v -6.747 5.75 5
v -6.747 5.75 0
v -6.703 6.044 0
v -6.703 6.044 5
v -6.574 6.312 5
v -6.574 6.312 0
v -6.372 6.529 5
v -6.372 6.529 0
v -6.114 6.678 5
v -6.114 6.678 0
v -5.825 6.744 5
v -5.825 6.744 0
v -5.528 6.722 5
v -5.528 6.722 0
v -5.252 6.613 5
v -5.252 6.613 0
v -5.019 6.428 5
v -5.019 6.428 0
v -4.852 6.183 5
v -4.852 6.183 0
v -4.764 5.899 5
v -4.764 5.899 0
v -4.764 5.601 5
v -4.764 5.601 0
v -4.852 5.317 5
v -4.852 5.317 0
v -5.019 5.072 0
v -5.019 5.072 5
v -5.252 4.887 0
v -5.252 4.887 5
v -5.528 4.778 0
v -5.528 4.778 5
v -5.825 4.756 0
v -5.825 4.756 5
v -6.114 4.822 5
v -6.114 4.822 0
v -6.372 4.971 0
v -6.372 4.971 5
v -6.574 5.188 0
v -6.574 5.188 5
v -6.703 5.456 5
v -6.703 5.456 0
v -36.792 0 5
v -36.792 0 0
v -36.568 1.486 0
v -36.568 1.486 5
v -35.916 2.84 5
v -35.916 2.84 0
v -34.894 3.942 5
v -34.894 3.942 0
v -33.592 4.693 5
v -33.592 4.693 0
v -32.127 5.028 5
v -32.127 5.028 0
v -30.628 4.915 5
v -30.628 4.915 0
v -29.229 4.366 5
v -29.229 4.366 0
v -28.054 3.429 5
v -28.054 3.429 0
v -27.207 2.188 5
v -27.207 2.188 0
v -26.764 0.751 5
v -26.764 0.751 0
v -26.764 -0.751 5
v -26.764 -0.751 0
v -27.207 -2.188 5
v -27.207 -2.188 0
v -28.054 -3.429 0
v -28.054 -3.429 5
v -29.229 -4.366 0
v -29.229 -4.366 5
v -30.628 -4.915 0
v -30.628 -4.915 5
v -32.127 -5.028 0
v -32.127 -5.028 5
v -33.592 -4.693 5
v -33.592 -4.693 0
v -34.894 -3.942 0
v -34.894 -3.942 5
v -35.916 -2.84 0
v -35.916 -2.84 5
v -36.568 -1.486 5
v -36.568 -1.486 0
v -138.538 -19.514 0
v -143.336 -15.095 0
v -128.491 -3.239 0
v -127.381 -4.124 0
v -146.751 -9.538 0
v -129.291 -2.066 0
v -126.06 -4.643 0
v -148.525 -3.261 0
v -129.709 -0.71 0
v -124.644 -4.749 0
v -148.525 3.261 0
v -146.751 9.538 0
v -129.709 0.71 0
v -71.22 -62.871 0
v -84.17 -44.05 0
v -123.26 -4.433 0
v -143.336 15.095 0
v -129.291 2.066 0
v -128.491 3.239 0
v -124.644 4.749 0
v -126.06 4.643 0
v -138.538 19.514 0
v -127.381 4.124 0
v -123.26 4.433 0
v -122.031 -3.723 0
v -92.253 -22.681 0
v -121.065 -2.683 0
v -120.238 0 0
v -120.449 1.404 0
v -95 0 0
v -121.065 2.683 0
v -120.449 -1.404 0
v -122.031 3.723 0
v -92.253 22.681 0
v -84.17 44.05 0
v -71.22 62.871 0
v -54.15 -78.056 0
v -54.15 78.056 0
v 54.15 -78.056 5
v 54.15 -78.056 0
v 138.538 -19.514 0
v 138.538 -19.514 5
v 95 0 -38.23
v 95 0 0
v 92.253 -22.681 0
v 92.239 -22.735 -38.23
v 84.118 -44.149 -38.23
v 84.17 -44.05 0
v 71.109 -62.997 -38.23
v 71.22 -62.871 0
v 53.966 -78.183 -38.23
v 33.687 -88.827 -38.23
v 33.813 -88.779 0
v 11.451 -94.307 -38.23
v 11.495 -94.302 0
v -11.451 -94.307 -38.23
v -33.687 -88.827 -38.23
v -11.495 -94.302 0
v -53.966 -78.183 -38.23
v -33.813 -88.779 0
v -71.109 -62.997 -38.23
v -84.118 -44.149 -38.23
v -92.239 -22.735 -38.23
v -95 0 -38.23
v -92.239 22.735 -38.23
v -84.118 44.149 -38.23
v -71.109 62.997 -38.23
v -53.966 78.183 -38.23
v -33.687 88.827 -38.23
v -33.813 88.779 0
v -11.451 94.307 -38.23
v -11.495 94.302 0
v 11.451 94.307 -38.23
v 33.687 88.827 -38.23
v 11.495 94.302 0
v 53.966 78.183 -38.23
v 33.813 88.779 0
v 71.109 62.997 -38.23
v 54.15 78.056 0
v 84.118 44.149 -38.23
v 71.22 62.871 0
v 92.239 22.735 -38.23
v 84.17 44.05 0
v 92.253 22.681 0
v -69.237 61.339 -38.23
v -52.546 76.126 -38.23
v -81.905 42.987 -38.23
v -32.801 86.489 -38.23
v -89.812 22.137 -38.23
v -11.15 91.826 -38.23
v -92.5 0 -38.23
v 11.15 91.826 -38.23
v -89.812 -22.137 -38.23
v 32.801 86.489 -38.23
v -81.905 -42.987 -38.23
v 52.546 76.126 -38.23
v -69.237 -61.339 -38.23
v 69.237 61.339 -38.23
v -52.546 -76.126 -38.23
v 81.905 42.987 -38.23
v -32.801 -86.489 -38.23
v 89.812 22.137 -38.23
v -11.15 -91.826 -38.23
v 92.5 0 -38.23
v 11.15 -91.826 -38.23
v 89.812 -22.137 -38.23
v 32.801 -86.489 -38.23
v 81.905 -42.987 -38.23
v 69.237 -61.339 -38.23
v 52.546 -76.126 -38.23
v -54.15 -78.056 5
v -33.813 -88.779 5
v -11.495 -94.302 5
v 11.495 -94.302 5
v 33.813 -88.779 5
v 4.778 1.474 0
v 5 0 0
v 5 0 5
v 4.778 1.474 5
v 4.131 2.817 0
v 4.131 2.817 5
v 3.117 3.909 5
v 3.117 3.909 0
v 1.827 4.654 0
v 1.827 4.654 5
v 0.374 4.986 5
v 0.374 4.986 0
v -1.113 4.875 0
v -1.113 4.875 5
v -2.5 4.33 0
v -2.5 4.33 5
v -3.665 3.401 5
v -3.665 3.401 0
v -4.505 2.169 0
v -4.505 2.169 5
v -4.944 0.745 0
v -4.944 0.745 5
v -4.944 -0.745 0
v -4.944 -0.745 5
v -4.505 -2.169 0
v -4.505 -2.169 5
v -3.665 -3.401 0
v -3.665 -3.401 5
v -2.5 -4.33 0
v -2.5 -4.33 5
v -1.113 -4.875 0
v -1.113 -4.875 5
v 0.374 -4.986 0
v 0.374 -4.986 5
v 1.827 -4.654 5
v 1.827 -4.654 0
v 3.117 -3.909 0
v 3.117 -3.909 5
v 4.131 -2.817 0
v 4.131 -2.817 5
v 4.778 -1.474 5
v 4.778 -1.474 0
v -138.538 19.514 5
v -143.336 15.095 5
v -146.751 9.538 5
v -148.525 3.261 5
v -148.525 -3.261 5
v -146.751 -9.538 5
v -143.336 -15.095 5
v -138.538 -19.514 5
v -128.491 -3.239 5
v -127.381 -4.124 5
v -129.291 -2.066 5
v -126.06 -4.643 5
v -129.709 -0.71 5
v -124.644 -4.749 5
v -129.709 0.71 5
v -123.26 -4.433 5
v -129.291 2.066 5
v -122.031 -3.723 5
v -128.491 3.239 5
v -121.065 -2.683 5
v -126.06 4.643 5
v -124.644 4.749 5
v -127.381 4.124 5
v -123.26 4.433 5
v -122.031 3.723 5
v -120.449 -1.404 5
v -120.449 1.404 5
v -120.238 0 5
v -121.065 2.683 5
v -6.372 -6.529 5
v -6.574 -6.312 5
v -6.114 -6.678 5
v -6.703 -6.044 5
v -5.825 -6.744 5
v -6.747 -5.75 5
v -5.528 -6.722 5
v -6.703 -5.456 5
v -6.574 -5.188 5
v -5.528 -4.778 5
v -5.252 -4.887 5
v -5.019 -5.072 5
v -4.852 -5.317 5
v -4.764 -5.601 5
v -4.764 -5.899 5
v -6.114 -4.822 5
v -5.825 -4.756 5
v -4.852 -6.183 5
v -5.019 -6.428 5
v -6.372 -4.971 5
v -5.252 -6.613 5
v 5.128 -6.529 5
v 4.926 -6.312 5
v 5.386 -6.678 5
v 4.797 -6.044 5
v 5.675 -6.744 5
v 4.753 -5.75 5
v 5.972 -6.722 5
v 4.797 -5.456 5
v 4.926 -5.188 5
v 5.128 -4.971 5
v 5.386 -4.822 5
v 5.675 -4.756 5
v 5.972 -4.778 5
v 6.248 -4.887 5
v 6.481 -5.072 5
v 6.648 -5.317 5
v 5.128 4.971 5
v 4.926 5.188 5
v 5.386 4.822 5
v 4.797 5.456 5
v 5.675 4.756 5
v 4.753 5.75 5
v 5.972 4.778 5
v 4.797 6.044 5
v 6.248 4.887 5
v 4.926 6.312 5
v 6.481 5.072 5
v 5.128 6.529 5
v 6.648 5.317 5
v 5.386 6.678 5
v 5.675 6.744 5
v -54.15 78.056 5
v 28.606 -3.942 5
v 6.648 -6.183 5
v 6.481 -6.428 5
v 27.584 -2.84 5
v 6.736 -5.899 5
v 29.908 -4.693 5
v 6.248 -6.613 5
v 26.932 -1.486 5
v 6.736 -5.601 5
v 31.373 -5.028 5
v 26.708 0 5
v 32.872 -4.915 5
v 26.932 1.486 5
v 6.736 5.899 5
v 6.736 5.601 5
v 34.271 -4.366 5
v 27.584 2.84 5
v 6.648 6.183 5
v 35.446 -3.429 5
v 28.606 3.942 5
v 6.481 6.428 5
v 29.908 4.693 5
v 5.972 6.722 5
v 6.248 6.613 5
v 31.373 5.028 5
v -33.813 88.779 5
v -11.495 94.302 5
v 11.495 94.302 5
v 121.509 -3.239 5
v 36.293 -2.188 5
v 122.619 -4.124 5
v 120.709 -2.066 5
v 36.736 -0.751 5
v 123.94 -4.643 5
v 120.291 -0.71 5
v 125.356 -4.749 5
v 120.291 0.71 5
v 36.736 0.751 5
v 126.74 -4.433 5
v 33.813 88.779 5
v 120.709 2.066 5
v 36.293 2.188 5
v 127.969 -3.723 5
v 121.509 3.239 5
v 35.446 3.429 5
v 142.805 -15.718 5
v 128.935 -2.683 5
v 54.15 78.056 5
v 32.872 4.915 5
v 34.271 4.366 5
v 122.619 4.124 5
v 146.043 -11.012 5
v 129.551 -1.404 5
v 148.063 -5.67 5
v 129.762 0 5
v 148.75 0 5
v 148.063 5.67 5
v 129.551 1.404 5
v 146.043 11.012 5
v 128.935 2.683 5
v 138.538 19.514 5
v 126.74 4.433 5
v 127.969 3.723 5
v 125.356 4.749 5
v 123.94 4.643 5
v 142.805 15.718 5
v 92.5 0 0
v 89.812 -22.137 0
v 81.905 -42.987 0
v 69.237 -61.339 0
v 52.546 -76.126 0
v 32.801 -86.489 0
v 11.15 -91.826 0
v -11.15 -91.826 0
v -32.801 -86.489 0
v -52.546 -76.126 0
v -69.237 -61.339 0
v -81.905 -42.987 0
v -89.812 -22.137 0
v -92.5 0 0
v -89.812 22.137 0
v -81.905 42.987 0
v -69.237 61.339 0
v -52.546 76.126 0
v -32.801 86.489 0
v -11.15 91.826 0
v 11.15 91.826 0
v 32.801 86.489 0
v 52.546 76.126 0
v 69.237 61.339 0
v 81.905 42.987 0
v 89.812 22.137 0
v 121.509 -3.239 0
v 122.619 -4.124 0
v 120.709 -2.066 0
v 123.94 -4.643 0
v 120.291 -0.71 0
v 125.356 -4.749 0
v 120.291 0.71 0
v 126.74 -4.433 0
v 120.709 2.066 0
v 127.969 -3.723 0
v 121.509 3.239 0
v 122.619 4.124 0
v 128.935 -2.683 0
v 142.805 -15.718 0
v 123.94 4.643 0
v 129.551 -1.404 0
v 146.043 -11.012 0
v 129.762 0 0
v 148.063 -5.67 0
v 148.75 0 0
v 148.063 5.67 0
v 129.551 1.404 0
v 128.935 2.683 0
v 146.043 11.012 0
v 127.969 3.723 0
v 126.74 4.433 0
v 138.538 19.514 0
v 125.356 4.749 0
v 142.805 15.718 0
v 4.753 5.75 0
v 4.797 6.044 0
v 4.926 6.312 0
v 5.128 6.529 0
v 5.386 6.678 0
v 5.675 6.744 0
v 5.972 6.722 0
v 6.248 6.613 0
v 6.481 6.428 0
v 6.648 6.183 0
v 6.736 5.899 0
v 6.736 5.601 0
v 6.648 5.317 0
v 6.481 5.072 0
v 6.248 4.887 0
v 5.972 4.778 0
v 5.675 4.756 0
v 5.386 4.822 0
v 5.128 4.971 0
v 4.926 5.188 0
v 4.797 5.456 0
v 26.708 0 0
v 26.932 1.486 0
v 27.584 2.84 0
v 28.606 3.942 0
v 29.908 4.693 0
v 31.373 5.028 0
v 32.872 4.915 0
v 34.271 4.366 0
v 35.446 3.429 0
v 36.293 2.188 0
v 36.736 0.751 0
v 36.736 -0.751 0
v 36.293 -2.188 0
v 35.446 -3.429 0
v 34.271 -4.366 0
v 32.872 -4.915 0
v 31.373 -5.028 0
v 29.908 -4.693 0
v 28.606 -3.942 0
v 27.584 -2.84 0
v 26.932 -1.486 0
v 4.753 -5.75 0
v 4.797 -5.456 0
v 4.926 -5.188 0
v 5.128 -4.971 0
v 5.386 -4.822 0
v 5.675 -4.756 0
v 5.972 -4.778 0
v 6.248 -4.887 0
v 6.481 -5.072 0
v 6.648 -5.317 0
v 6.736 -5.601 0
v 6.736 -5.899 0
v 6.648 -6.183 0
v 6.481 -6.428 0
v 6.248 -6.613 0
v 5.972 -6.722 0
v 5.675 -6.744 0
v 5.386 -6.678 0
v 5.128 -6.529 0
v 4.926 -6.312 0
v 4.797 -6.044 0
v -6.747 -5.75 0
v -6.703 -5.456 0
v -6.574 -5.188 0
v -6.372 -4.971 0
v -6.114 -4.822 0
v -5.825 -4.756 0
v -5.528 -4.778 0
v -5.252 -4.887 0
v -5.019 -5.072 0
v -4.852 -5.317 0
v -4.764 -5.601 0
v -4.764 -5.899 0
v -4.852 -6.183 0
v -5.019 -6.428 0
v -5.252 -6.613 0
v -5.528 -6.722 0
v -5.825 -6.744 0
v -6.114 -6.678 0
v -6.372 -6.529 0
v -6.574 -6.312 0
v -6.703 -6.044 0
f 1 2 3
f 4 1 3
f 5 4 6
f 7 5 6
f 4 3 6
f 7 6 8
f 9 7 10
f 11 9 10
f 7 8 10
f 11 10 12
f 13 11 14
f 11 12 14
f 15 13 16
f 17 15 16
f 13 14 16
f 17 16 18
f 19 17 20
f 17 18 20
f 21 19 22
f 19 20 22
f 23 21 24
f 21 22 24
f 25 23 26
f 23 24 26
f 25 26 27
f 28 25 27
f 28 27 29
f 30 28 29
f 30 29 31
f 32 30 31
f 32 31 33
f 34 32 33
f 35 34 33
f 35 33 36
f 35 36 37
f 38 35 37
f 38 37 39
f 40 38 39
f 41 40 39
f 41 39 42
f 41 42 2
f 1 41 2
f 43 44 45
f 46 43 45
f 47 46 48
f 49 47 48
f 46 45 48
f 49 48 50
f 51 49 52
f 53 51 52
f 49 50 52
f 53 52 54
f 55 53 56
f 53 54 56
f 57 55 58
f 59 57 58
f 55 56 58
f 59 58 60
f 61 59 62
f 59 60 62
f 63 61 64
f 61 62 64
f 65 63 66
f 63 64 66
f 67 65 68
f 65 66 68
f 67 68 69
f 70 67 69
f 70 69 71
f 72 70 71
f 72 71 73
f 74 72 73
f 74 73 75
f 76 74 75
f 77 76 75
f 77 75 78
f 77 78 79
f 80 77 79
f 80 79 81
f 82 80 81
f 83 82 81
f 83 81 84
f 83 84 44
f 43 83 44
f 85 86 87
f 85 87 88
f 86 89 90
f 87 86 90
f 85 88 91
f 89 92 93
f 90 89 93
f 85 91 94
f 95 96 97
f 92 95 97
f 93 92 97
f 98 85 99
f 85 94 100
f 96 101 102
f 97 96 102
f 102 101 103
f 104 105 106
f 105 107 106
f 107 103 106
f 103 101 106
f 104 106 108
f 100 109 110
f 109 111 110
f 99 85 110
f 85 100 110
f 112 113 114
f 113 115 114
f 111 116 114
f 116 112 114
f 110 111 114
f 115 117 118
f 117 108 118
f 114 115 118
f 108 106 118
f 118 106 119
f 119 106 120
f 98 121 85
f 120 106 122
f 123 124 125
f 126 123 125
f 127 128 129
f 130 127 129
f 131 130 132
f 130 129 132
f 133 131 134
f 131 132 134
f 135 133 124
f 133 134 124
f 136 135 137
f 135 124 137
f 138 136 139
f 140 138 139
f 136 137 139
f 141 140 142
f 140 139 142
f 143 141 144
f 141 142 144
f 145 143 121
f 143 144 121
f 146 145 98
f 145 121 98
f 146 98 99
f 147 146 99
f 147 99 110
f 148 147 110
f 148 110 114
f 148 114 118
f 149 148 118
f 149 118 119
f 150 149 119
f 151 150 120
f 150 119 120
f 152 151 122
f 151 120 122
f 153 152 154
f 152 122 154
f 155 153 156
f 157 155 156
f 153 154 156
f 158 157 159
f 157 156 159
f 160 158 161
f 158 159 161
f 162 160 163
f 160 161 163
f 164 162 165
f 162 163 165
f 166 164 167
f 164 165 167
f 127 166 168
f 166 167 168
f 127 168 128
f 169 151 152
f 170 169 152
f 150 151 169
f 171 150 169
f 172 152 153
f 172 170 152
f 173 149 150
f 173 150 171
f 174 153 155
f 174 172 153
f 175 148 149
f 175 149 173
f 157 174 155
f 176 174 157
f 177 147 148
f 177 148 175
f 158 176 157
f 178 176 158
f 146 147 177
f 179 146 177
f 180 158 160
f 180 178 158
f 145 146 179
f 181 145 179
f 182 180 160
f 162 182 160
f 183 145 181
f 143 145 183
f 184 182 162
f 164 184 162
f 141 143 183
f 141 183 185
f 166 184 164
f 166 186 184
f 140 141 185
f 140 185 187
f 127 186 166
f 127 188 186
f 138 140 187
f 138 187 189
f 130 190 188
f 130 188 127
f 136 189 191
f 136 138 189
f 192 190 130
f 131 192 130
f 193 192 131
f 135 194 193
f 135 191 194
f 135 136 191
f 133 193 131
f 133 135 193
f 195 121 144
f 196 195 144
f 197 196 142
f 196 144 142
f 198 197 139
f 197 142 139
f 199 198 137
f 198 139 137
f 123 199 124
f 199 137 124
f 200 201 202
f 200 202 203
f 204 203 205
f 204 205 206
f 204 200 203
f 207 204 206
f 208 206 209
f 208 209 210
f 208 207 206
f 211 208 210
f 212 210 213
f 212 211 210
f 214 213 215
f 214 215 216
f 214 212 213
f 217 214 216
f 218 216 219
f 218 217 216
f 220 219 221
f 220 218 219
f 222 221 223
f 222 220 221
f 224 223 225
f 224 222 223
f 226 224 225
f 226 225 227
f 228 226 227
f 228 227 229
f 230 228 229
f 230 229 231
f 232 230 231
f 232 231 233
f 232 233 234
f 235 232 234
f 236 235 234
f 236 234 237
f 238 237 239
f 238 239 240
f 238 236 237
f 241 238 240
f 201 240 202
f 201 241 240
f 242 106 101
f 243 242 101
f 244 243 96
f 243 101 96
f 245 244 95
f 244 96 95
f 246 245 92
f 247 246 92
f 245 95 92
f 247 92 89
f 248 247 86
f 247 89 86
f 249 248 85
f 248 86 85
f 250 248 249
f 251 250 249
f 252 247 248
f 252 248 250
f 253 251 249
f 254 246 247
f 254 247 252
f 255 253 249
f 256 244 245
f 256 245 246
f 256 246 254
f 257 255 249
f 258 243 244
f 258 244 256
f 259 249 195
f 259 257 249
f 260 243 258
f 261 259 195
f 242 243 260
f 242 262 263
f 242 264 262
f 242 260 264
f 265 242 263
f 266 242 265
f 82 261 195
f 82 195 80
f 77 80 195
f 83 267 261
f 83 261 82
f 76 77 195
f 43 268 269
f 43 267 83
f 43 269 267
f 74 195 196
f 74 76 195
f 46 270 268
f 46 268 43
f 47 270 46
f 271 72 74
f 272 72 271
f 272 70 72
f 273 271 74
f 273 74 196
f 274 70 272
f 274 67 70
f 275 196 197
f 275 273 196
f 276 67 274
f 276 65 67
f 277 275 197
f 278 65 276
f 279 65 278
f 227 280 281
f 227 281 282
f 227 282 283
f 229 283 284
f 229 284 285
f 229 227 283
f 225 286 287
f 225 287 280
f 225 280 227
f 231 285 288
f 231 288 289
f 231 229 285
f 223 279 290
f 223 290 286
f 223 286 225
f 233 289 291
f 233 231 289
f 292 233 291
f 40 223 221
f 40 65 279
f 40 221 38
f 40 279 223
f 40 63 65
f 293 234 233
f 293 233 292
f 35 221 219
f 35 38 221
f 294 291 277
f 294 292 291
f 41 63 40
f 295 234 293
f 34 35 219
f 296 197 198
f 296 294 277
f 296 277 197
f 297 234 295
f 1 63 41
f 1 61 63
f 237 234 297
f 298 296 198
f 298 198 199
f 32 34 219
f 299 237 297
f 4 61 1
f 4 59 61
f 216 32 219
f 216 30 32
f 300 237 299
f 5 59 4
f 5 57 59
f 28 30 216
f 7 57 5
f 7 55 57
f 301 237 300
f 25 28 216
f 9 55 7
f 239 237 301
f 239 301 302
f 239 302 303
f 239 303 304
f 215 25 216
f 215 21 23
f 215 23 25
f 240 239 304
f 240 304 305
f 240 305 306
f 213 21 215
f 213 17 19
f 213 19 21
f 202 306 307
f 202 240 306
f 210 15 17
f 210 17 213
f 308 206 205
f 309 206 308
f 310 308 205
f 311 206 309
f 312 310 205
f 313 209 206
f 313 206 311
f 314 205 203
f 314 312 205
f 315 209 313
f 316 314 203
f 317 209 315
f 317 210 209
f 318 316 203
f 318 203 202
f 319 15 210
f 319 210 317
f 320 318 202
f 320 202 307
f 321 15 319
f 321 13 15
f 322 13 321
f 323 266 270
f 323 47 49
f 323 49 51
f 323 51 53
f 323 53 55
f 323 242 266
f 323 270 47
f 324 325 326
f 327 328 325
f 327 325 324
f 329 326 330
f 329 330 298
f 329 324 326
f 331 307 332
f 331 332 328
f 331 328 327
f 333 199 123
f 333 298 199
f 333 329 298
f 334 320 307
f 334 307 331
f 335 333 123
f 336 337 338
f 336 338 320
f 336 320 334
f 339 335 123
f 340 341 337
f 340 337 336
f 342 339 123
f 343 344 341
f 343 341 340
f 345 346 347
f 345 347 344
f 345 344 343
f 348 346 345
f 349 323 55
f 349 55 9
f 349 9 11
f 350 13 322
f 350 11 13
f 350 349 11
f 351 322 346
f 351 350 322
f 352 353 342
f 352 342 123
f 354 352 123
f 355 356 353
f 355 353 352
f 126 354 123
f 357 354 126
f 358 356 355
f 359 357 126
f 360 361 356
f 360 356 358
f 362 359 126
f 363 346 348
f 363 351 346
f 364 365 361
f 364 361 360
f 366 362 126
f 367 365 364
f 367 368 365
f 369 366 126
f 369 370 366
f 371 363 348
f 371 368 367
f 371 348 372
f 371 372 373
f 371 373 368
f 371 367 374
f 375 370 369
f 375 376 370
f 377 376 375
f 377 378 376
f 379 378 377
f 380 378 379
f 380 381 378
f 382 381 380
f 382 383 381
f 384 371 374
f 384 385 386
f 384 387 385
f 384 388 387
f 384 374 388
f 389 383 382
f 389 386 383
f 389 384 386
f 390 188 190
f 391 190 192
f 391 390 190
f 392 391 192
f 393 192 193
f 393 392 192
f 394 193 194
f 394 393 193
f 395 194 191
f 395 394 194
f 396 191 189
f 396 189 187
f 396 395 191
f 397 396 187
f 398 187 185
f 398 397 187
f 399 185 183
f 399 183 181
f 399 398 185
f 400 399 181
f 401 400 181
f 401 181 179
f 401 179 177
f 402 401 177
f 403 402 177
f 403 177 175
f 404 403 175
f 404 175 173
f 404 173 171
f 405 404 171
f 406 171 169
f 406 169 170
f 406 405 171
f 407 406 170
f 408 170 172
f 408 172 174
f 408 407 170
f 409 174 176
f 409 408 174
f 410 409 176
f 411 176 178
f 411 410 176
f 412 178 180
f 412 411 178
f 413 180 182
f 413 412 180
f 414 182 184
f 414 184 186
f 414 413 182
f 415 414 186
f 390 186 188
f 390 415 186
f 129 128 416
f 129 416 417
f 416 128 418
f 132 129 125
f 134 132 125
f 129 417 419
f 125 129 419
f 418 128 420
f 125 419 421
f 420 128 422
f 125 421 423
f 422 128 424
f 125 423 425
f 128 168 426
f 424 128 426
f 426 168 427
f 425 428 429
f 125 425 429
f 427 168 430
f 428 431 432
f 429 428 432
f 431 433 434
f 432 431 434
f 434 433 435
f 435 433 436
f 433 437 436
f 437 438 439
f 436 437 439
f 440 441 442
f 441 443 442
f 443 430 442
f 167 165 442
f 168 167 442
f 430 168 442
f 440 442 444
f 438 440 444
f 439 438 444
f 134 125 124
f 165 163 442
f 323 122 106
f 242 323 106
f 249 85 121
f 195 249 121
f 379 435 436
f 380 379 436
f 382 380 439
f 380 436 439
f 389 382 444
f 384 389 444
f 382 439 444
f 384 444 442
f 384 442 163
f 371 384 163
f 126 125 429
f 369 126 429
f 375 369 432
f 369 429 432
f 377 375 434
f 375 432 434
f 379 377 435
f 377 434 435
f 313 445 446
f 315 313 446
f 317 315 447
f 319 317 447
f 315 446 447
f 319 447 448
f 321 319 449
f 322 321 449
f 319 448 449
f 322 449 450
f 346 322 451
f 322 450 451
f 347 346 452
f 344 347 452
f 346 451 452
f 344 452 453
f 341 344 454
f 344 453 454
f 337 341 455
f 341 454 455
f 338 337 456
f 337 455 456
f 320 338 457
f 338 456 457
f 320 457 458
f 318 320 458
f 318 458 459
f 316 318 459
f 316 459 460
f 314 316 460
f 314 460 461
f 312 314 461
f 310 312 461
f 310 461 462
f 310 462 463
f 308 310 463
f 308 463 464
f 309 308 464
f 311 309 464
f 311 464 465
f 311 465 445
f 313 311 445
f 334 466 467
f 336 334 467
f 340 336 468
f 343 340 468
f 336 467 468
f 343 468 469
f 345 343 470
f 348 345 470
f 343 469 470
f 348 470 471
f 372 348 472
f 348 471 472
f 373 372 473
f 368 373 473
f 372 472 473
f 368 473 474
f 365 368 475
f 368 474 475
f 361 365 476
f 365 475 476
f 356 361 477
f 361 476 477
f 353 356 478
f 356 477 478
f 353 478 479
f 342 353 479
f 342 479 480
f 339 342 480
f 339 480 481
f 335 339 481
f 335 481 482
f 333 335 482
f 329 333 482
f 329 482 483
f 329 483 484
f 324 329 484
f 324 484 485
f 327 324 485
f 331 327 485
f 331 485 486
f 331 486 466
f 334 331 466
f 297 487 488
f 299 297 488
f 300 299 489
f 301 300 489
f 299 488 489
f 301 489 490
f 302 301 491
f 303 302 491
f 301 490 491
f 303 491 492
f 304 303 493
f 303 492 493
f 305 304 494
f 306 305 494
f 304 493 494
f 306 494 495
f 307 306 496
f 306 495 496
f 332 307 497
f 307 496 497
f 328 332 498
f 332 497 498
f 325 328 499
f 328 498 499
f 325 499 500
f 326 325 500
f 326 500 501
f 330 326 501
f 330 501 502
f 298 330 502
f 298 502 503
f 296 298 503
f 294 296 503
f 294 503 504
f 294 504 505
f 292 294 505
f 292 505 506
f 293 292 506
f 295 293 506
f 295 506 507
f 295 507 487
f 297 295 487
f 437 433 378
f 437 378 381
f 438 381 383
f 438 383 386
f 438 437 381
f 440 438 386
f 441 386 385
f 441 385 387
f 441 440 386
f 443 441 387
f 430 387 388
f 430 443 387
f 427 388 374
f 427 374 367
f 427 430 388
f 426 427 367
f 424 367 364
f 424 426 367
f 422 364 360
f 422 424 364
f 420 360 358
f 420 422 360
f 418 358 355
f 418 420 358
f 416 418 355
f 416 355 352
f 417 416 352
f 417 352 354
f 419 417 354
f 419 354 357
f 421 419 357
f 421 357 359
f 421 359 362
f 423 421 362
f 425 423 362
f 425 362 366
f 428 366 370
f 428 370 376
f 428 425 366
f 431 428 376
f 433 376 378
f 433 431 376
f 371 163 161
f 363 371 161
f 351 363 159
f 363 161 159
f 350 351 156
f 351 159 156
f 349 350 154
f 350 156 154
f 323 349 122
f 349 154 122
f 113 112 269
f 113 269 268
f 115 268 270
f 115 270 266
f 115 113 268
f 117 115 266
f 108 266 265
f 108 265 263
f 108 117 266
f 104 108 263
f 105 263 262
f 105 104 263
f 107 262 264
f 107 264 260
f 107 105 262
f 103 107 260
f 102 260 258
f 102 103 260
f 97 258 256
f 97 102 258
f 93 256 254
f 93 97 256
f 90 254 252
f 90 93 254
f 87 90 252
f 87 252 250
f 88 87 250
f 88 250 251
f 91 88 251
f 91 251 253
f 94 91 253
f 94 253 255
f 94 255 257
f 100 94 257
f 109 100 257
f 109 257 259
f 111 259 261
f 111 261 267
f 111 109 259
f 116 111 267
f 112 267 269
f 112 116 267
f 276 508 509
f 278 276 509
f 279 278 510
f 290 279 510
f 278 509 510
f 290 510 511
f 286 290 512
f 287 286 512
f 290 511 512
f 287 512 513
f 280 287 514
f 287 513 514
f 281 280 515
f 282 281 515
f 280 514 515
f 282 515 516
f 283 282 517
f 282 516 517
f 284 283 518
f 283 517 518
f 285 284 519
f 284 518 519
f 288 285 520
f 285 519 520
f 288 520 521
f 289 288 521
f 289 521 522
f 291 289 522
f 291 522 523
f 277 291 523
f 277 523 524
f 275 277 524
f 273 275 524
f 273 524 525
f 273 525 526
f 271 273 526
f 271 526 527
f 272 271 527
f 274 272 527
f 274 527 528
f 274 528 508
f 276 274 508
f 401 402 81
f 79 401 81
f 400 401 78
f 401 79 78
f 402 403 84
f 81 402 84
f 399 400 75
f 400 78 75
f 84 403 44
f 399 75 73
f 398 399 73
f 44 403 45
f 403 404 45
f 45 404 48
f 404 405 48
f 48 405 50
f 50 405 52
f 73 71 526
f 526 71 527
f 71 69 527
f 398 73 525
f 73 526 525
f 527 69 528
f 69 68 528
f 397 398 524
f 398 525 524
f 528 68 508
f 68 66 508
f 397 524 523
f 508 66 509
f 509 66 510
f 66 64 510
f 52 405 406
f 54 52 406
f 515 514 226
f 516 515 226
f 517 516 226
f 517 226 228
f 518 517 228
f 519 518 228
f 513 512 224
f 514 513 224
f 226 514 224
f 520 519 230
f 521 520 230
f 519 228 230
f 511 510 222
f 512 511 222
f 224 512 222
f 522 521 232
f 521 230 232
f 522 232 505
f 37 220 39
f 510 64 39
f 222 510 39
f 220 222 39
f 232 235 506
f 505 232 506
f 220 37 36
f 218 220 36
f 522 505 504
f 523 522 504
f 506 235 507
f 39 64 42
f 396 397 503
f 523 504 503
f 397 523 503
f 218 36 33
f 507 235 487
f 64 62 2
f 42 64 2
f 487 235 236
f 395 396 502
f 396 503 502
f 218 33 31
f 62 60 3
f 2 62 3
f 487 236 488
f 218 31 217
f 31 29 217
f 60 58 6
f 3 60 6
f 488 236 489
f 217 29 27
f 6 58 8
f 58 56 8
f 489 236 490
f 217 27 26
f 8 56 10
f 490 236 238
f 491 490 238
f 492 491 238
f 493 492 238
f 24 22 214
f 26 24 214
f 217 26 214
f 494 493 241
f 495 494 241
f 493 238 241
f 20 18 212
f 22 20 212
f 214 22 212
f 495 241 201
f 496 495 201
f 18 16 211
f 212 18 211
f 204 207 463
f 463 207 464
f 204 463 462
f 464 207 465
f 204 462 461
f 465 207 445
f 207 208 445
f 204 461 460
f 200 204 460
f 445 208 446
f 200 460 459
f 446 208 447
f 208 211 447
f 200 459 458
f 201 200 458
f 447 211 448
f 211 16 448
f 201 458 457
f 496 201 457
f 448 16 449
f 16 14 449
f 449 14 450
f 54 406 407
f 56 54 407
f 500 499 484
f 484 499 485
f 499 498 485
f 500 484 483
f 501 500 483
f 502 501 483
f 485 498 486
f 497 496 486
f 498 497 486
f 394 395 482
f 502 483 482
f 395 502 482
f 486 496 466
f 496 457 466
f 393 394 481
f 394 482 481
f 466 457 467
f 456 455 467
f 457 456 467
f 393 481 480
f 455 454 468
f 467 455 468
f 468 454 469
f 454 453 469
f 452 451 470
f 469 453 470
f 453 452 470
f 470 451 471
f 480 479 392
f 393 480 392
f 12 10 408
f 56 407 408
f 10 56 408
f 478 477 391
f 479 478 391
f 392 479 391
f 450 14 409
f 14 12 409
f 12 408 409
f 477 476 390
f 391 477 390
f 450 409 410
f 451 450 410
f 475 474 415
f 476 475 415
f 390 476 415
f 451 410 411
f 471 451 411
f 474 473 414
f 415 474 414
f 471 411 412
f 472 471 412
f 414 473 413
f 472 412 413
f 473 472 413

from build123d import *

# Parameters (mm, degrees)
F0_R     = 5
F0_R_2   = 4.7625
F1_DEPTH = 5
F2_R     = 95
F2_R_2   = 92.5
F3_DEPTH = 38.23
F6_D     = 1.9939
F6_DEPTH = 13.58625
F6_TIP   = 0.5990279941
F7_D     = 10.0838
F7_DEPTH = 13.59
F7_TIP   = 3.0294791551


with BuildPart() as f1:
    # F0 (on Top) → F1 (new body)
    with BuildSketch(Plane.XY):
        with BuildLine():
            ThreePointArc((54.15, -78.0562457463), (84.1702144467, -44.0496878536), (95, 0))
            ThreePointArc((95, 0), (84.1702144467, 44.0496878536), (54.15, 78.0562457463))
            ThreePointArc((54.15, 78.0562457463), (0, 95), (-54.15, 78.0562457463))
            ThreePointArc((-54.15, 78.0562457463), (-95, 0), (-54.15, -78.0562457463))
            ThreePointArc((-54.15, -78.0562457463), (0, -95), (54.15, -78.0562457463))
        make_face()
        Circle(F0_R, mode=Mode.SUBTRACT)
        with BuildLine():
            ThreePointArc((54.15, 78.0562457463), (84.1702144467, 44.0496878536), (95, 0))
            ThreePointArc((95, 0), (84.1702144467, -44.0496878536), (54.15, -78.0562457463))
            Line((54.15, -78.0562457463), (138.5375, -19.5140614366))
            ThreePointArc((138.5375, -19.5140614366), (101.25, 0), (138.5375, 19.5140614366))
            Line((138.5375, 19.5140614366), (54.15, 78.0562457463))
        make_face()
        with BuildLine():
            ThreePointArc((-54.15, -78.0562457463), (-95, 0), (-54.15, 78.0562457463))
            Line((-54.15, 78.0562457463), (-138.5375, 19.5140614366))
            ThreePointArc((-138.5375, 19.5140614366), (-113.9875780366, 21.0425536117), (-101.25, 0))
            ThreePointArc((-101.25, 0), (-113.9875780366, -21.0425536117), (-138.5375, -19.5140614366))
            Line((-138.5375, -19.5140614366), (-54.15, -78.0562457463))
        make_face()
        with BuildLine():
            ThreePointArc((148.75, 0), (146.0425536117, 11.0124219634), (138.5375, 19.5140614366))
            ThreePointArc((138.5375, 19.5140614366), (101.25, 0), (138.5375, -19.5140614366))
            ThreePointArc((138.5375, -19.5140614366), (146.0425536117, -11.0124219634), (148.75, 0))
        make_face()
        with Locations((125, 0)):
            Circle(F0_R_2, mode=Mode.SUBTRACT)
        with BuildLine():
            ThreePointArc((-101.25, 0), (-113.9875780366, 21.0425536117), (-138.5375, 19.5140614366))
            ThreePointArc((-138.5375, 19.5140614366), (-148.75, 0), (-138.5375, -19.5140614366))
            ThreePointArc((-138.5375, -19.5140614366), (-113.9875780366, -21.0425536117), (-101.25, 0))
        make_face()
        with Locations((-125, 0)):
            Circle(F0_R_2, mode=Mode.SUBTRACT)
    extrude(amount=F1_DEPTH)

    # F2 (on face) → F3 (join)
    with BuildSketch(Plane(origin=(0, 0, 0), x_dir=(1, 0, 0), z_dir=(0, 0, -1))):
        Circle(F2_R)
        Circle(F2_R_2, mode=Mode.SUBTRACT)
    extrude(amount=F3_DEPTH)

    # F6
    with Locations(Plane.XY.offset(5)):
        with Locations((-5.75, 5.75), (5.75, 5.75), (5.75, -5.75), (-5.75, -5.75)):
            Hole(F6_D / 2, depth=F6_DEPTH)
            with Locations((0, 0, -(F6_DEPTH + F6_TIP / 2))):  # 118° drill point
                Cone(0, F6_D / 2, F6_TIP, mode=Mode.SUBTRACT)

    # F7
    with Locations(Plane.XY.offset(5)):
        with Locations((-31.75, 0), (31.75, 0)):
            Hole(F7_D / 2, depth=F7_DEPTH)
            with Locations((0, 0, -(F7_DEPTH + F7_TIP / 2))):  # 118° drill point
                Cone(0, F7_D / 2, F7_TIP, mode=Mode.SUBTRACT)


solid = f1.part
